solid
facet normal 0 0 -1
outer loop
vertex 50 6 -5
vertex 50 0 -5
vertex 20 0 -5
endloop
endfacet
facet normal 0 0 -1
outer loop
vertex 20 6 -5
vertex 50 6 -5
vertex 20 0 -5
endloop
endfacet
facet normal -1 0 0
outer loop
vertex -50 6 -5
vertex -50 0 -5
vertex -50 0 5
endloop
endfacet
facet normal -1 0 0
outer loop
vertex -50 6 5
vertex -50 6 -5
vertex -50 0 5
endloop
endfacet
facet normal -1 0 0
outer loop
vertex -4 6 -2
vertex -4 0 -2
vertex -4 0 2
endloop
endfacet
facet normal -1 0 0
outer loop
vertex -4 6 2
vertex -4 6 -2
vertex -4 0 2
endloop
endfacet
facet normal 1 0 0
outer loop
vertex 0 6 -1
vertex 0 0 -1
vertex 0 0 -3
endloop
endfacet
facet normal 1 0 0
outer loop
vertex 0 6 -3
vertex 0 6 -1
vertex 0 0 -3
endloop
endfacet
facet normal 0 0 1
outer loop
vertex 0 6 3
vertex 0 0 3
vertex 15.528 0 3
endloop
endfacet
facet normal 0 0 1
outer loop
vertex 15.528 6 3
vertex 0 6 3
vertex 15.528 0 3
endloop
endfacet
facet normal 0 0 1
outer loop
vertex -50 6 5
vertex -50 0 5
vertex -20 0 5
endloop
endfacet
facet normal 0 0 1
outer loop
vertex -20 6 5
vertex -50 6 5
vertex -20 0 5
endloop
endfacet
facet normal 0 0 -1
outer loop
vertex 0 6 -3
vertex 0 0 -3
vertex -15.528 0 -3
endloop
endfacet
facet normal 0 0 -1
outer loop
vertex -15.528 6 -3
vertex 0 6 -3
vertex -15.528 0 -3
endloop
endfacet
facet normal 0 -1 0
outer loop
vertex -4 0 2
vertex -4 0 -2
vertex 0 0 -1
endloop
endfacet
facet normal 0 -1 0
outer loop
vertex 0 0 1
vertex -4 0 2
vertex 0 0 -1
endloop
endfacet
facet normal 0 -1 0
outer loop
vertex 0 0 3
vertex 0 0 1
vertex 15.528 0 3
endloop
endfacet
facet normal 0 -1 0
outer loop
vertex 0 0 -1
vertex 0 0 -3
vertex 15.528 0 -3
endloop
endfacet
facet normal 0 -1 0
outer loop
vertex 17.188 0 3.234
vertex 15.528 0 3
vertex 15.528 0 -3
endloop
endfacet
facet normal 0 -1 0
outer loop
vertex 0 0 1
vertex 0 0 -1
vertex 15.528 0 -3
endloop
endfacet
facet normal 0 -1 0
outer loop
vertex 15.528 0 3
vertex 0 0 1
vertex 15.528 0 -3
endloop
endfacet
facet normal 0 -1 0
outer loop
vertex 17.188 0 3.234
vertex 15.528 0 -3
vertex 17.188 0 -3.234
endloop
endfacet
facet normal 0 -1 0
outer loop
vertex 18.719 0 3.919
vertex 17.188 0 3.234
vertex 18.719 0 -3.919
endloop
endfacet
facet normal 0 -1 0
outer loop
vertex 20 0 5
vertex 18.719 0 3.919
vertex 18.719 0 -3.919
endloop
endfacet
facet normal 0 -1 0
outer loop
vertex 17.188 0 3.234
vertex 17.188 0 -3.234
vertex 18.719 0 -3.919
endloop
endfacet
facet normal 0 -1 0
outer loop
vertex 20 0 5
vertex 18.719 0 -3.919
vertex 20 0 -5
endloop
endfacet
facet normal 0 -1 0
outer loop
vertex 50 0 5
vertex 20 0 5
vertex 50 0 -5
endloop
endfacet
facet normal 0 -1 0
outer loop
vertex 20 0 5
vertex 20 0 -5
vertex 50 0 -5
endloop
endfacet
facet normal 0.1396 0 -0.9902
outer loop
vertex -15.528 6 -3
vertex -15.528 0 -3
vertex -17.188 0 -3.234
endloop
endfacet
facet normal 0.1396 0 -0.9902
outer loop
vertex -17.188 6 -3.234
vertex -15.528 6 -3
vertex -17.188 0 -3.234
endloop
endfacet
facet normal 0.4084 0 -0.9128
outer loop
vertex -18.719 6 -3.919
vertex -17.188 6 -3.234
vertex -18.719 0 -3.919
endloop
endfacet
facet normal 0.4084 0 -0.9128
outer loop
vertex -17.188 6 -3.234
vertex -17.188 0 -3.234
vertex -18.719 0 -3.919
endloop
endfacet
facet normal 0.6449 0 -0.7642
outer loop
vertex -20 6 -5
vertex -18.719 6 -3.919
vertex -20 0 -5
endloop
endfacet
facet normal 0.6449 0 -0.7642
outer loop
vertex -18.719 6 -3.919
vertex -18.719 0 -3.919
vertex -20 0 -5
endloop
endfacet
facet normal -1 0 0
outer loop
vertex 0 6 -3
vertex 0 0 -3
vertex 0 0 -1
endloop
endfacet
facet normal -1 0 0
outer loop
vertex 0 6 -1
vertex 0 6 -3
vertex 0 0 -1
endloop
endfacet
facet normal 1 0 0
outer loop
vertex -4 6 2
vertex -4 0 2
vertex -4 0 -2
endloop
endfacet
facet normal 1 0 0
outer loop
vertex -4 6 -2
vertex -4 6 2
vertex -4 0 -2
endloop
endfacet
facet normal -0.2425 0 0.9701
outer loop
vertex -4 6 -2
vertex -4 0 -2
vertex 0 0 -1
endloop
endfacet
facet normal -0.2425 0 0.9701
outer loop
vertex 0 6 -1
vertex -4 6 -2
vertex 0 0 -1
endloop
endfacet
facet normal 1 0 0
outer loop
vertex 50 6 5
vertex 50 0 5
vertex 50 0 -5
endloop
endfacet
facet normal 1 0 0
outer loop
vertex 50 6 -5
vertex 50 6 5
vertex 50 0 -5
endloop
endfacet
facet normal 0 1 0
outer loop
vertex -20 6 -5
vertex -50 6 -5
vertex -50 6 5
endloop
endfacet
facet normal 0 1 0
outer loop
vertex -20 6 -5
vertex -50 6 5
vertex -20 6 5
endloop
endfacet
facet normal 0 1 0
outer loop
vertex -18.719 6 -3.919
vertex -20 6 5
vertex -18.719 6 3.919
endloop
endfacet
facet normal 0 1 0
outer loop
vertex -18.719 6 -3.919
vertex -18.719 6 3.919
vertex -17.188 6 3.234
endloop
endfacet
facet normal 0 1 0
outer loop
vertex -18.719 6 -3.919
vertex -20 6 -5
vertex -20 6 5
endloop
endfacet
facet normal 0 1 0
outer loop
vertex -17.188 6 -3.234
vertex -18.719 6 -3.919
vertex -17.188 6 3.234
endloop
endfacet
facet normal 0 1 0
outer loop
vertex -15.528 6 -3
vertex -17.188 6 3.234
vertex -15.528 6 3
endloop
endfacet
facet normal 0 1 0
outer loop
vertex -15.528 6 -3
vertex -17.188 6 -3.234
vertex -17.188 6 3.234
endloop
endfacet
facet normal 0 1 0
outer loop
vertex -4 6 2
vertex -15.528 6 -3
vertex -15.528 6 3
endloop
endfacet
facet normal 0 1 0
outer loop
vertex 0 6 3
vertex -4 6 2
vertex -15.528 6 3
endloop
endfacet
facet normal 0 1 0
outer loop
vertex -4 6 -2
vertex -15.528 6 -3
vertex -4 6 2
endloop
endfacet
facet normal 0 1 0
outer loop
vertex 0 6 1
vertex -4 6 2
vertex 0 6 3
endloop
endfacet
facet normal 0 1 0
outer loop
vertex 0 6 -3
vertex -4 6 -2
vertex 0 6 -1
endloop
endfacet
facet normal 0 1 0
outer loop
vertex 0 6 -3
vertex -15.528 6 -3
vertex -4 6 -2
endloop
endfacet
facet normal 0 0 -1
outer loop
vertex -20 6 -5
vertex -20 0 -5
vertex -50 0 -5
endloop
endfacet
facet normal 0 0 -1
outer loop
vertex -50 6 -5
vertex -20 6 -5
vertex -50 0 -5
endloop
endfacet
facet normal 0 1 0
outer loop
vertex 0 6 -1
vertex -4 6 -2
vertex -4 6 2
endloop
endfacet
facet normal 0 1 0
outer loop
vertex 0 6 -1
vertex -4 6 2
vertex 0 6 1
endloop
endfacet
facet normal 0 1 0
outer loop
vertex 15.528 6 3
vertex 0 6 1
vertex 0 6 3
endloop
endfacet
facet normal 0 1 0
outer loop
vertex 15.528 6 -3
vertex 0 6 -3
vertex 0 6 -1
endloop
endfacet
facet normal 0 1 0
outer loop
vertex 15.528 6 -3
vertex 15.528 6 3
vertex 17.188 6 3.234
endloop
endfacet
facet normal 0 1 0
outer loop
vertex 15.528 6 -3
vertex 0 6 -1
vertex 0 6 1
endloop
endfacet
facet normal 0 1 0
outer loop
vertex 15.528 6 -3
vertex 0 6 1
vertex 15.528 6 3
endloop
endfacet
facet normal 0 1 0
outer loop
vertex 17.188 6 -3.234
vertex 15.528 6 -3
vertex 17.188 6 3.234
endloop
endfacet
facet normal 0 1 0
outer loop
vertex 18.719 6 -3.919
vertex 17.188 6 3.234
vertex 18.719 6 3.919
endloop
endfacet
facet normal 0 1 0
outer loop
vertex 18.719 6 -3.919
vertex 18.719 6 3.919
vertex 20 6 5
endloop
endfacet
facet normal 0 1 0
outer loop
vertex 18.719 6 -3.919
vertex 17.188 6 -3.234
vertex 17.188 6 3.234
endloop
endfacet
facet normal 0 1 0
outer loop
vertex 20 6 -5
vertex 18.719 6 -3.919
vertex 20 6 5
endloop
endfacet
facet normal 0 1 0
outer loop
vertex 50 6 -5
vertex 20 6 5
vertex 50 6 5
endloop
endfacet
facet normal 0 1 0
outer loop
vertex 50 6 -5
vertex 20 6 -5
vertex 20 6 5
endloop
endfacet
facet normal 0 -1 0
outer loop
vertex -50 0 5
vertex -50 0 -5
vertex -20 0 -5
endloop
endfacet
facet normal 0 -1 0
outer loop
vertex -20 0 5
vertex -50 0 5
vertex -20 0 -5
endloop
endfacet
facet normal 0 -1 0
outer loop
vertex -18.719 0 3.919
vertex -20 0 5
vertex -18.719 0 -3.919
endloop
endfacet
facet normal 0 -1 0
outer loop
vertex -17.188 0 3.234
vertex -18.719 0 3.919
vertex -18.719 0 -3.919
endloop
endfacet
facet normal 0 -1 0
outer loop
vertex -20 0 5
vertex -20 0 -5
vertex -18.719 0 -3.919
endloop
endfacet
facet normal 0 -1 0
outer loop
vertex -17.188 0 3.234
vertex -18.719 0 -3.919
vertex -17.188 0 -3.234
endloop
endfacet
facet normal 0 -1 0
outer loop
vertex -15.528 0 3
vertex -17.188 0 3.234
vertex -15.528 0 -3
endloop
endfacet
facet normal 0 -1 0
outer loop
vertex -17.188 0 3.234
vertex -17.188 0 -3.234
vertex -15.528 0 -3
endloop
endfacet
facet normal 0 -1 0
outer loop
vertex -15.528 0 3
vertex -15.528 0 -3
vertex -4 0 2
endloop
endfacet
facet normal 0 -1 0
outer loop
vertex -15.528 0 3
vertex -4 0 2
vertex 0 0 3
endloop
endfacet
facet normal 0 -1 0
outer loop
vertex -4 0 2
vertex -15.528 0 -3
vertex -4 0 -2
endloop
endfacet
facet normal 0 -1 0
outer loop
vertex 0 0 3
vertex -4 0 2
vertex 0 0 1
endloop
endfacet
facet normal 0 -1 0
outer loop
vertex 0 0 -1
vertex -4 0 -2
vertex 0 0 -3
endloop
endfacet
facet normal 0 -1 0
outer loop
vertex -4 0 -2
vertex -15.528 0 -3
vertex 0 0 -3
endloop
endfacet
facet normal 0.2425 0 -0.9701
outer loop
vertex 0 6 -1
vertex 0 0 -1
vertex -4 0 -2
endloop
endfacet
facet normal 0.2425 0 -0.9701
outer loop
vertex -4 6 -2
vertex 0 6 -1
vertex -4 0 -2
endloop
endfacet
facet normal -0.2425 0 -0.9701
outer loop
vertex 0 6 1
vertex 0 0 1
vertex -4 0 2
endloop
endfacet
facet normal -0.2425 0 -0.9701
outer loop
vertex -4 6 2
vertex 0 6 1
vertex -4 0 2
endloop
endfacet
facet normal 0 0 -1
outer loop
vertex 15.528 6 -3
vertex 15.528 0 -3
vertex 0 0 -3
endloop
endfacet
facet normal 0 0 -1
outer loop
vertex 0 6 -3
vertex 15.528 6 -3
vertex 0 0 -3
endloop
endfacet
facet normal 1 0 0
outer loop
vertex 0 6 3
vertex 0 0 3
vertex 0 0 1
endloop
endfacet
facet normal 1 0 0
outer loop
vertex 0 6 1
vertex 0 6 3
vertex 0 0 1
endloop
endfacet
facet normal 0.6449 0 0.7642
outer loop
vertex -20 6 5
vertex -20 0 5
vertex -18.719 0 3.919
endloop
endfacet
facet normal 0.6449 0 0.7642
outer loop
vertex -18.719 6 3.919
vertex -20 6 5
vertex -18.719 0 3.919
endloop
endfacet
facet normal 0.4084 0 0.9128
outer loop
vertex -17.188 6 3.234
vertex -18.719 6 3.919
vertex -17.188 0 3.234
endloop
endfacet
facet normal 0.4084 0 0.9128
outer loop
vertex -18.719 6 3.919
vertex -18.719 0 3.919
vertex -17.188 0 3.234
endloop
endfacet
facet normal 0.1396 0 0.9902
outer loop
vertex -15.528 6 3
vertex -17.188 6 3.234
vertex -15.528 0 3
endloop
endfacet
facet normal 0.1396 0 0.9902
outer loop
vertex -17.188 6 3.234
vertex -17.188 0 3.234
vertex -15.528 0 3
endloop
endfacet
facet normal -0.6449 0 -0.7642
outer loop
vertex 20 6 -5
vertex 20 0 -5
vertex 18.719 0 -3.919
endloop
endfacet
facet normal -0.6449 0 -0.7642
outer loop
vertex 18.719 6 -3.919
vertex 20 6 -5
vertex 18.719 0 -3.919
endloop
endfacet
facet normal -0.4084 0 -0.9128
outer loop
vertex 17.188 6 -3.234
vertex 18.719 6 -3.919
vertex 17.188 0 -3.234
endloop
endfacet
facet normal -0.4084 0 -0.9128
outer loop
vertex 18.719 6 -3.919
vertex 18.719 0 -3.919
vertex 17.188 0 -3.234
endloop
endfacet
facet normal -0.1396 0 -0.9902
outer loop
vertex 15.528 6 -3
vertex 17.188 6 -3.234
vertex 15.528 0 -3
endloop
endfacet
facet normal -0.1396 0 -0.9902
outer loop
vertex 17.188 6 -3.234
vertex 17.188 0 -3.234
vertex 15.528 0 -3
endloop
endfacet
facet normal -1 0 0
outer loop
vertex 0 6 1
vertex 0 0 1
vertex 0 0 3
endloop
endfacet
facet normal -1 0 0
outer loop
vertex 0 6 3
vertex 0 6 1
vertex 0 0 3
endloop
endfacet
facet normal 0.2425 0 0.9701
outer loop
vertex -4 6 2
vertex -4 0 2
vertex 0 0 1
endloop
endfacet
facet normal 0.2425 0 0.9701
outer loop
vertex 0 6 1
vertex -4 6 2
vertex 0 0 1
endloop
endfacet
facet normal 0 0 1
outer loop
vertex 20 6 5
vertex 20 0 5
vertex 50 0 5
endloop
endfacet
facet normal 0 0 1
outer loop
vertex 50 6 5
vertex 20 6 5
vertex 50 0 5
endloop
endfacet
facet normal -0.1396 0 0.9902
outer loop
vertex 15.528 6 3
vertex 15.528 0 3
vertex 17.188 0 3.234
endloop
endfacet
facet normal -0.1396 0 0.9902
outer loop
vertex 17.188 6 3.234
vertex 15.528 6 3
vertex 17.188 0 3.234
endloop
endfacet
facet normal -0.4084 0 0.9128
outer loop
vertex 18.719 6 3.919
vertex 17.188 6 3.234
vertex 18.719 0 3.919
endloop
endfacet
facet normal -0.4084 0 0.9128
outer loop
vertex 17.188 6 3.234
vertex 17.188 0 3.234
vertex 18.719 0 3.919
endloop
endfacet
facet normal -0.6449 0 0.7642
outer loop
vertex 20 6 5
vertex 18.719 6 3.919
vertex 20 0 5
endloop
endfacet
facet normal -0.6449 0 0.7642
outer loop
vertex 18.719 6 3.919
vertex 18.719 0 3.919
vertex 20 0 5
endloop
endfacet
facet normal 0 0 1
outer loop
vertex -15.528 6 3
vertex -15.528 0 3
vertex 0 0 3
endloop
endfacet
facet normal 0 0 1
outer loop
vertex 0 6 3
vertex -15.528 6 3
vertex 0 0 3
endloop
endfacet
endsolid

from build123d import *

# Parameters (mm, degrees)
BOSS_EXTRUDE1_DEPTH = 6
BOSS_EXTRUDE2_DEPTH = 6


with BuildPart() as part:
    # Sketch1 → Boss-Extrude1 (new body)
    with BuildSketch(Plane(origin=(0, 0, 0), x_dir=(1, 0, 0), z_dir=(0, 1, 0))):
        with BuildLine():
            Line((0, 1), (0, 3))
            Line((0, 3), (-15.527864045, 3))
            ThreePointArc((-15.527864045, 3), (-17.977353788, 3.522774425), (-20, 5))
            Line((-20, 5), (-50, 5))
            Line((-50, 5), (-50, -5))
            Line((-50, -5), (-20, -5))
            ThreePointArc((-20, -5), (-17.977353788, -3.522774425), (-15.527864045, -3))
            Line((-15.527864045, -3), (0, -3))
            Line((0, -3), (0, -1))
            Line((0, -1), (-4, -2))
            Line((-4, -2), (-4, 2))
            Line((-4, 2), (0, 1))
        make_face()
    extrude(amount=BOSS_EXTRUDE1_DEPTH)


with BuildPart() as body_2:
    # Sketch1<4> → Boss-Extrude2 (new body)
    with BuildSketch(Plane(origin=(0, 0, 0), x_dir=(1, 0, 0), z_dir=(0, 1, 0))):
        with BuildLine():
            ThreePointArc((20, 5), (17.977353788, 3.522774425), (15.527864045, 3))
            Line((15.527864045, 3), (0, 3))
            Line((0, 3), (0, 1))
            Line((0, 1), (-4, 2))
            Line((-4, 2), (-4, -2))
            Line((-4, -2), (0, -1))
            Line((0, -1), (0, -3))
            Line((0, -3), (15.527864045, -3))
            ThreePointArc((15.527864045, -3), (17.977353788, -3.522774425), (20, -5))
            Line((20, -5), (50, -5))
            Line((50, -5), (50, 5))
            Line((50, 5), (20, 5))
        make_face()
    extrude(amount=BOSS_EXTRUDE2_DEPTH)


solid = Compound([part.part, body_2.part])
